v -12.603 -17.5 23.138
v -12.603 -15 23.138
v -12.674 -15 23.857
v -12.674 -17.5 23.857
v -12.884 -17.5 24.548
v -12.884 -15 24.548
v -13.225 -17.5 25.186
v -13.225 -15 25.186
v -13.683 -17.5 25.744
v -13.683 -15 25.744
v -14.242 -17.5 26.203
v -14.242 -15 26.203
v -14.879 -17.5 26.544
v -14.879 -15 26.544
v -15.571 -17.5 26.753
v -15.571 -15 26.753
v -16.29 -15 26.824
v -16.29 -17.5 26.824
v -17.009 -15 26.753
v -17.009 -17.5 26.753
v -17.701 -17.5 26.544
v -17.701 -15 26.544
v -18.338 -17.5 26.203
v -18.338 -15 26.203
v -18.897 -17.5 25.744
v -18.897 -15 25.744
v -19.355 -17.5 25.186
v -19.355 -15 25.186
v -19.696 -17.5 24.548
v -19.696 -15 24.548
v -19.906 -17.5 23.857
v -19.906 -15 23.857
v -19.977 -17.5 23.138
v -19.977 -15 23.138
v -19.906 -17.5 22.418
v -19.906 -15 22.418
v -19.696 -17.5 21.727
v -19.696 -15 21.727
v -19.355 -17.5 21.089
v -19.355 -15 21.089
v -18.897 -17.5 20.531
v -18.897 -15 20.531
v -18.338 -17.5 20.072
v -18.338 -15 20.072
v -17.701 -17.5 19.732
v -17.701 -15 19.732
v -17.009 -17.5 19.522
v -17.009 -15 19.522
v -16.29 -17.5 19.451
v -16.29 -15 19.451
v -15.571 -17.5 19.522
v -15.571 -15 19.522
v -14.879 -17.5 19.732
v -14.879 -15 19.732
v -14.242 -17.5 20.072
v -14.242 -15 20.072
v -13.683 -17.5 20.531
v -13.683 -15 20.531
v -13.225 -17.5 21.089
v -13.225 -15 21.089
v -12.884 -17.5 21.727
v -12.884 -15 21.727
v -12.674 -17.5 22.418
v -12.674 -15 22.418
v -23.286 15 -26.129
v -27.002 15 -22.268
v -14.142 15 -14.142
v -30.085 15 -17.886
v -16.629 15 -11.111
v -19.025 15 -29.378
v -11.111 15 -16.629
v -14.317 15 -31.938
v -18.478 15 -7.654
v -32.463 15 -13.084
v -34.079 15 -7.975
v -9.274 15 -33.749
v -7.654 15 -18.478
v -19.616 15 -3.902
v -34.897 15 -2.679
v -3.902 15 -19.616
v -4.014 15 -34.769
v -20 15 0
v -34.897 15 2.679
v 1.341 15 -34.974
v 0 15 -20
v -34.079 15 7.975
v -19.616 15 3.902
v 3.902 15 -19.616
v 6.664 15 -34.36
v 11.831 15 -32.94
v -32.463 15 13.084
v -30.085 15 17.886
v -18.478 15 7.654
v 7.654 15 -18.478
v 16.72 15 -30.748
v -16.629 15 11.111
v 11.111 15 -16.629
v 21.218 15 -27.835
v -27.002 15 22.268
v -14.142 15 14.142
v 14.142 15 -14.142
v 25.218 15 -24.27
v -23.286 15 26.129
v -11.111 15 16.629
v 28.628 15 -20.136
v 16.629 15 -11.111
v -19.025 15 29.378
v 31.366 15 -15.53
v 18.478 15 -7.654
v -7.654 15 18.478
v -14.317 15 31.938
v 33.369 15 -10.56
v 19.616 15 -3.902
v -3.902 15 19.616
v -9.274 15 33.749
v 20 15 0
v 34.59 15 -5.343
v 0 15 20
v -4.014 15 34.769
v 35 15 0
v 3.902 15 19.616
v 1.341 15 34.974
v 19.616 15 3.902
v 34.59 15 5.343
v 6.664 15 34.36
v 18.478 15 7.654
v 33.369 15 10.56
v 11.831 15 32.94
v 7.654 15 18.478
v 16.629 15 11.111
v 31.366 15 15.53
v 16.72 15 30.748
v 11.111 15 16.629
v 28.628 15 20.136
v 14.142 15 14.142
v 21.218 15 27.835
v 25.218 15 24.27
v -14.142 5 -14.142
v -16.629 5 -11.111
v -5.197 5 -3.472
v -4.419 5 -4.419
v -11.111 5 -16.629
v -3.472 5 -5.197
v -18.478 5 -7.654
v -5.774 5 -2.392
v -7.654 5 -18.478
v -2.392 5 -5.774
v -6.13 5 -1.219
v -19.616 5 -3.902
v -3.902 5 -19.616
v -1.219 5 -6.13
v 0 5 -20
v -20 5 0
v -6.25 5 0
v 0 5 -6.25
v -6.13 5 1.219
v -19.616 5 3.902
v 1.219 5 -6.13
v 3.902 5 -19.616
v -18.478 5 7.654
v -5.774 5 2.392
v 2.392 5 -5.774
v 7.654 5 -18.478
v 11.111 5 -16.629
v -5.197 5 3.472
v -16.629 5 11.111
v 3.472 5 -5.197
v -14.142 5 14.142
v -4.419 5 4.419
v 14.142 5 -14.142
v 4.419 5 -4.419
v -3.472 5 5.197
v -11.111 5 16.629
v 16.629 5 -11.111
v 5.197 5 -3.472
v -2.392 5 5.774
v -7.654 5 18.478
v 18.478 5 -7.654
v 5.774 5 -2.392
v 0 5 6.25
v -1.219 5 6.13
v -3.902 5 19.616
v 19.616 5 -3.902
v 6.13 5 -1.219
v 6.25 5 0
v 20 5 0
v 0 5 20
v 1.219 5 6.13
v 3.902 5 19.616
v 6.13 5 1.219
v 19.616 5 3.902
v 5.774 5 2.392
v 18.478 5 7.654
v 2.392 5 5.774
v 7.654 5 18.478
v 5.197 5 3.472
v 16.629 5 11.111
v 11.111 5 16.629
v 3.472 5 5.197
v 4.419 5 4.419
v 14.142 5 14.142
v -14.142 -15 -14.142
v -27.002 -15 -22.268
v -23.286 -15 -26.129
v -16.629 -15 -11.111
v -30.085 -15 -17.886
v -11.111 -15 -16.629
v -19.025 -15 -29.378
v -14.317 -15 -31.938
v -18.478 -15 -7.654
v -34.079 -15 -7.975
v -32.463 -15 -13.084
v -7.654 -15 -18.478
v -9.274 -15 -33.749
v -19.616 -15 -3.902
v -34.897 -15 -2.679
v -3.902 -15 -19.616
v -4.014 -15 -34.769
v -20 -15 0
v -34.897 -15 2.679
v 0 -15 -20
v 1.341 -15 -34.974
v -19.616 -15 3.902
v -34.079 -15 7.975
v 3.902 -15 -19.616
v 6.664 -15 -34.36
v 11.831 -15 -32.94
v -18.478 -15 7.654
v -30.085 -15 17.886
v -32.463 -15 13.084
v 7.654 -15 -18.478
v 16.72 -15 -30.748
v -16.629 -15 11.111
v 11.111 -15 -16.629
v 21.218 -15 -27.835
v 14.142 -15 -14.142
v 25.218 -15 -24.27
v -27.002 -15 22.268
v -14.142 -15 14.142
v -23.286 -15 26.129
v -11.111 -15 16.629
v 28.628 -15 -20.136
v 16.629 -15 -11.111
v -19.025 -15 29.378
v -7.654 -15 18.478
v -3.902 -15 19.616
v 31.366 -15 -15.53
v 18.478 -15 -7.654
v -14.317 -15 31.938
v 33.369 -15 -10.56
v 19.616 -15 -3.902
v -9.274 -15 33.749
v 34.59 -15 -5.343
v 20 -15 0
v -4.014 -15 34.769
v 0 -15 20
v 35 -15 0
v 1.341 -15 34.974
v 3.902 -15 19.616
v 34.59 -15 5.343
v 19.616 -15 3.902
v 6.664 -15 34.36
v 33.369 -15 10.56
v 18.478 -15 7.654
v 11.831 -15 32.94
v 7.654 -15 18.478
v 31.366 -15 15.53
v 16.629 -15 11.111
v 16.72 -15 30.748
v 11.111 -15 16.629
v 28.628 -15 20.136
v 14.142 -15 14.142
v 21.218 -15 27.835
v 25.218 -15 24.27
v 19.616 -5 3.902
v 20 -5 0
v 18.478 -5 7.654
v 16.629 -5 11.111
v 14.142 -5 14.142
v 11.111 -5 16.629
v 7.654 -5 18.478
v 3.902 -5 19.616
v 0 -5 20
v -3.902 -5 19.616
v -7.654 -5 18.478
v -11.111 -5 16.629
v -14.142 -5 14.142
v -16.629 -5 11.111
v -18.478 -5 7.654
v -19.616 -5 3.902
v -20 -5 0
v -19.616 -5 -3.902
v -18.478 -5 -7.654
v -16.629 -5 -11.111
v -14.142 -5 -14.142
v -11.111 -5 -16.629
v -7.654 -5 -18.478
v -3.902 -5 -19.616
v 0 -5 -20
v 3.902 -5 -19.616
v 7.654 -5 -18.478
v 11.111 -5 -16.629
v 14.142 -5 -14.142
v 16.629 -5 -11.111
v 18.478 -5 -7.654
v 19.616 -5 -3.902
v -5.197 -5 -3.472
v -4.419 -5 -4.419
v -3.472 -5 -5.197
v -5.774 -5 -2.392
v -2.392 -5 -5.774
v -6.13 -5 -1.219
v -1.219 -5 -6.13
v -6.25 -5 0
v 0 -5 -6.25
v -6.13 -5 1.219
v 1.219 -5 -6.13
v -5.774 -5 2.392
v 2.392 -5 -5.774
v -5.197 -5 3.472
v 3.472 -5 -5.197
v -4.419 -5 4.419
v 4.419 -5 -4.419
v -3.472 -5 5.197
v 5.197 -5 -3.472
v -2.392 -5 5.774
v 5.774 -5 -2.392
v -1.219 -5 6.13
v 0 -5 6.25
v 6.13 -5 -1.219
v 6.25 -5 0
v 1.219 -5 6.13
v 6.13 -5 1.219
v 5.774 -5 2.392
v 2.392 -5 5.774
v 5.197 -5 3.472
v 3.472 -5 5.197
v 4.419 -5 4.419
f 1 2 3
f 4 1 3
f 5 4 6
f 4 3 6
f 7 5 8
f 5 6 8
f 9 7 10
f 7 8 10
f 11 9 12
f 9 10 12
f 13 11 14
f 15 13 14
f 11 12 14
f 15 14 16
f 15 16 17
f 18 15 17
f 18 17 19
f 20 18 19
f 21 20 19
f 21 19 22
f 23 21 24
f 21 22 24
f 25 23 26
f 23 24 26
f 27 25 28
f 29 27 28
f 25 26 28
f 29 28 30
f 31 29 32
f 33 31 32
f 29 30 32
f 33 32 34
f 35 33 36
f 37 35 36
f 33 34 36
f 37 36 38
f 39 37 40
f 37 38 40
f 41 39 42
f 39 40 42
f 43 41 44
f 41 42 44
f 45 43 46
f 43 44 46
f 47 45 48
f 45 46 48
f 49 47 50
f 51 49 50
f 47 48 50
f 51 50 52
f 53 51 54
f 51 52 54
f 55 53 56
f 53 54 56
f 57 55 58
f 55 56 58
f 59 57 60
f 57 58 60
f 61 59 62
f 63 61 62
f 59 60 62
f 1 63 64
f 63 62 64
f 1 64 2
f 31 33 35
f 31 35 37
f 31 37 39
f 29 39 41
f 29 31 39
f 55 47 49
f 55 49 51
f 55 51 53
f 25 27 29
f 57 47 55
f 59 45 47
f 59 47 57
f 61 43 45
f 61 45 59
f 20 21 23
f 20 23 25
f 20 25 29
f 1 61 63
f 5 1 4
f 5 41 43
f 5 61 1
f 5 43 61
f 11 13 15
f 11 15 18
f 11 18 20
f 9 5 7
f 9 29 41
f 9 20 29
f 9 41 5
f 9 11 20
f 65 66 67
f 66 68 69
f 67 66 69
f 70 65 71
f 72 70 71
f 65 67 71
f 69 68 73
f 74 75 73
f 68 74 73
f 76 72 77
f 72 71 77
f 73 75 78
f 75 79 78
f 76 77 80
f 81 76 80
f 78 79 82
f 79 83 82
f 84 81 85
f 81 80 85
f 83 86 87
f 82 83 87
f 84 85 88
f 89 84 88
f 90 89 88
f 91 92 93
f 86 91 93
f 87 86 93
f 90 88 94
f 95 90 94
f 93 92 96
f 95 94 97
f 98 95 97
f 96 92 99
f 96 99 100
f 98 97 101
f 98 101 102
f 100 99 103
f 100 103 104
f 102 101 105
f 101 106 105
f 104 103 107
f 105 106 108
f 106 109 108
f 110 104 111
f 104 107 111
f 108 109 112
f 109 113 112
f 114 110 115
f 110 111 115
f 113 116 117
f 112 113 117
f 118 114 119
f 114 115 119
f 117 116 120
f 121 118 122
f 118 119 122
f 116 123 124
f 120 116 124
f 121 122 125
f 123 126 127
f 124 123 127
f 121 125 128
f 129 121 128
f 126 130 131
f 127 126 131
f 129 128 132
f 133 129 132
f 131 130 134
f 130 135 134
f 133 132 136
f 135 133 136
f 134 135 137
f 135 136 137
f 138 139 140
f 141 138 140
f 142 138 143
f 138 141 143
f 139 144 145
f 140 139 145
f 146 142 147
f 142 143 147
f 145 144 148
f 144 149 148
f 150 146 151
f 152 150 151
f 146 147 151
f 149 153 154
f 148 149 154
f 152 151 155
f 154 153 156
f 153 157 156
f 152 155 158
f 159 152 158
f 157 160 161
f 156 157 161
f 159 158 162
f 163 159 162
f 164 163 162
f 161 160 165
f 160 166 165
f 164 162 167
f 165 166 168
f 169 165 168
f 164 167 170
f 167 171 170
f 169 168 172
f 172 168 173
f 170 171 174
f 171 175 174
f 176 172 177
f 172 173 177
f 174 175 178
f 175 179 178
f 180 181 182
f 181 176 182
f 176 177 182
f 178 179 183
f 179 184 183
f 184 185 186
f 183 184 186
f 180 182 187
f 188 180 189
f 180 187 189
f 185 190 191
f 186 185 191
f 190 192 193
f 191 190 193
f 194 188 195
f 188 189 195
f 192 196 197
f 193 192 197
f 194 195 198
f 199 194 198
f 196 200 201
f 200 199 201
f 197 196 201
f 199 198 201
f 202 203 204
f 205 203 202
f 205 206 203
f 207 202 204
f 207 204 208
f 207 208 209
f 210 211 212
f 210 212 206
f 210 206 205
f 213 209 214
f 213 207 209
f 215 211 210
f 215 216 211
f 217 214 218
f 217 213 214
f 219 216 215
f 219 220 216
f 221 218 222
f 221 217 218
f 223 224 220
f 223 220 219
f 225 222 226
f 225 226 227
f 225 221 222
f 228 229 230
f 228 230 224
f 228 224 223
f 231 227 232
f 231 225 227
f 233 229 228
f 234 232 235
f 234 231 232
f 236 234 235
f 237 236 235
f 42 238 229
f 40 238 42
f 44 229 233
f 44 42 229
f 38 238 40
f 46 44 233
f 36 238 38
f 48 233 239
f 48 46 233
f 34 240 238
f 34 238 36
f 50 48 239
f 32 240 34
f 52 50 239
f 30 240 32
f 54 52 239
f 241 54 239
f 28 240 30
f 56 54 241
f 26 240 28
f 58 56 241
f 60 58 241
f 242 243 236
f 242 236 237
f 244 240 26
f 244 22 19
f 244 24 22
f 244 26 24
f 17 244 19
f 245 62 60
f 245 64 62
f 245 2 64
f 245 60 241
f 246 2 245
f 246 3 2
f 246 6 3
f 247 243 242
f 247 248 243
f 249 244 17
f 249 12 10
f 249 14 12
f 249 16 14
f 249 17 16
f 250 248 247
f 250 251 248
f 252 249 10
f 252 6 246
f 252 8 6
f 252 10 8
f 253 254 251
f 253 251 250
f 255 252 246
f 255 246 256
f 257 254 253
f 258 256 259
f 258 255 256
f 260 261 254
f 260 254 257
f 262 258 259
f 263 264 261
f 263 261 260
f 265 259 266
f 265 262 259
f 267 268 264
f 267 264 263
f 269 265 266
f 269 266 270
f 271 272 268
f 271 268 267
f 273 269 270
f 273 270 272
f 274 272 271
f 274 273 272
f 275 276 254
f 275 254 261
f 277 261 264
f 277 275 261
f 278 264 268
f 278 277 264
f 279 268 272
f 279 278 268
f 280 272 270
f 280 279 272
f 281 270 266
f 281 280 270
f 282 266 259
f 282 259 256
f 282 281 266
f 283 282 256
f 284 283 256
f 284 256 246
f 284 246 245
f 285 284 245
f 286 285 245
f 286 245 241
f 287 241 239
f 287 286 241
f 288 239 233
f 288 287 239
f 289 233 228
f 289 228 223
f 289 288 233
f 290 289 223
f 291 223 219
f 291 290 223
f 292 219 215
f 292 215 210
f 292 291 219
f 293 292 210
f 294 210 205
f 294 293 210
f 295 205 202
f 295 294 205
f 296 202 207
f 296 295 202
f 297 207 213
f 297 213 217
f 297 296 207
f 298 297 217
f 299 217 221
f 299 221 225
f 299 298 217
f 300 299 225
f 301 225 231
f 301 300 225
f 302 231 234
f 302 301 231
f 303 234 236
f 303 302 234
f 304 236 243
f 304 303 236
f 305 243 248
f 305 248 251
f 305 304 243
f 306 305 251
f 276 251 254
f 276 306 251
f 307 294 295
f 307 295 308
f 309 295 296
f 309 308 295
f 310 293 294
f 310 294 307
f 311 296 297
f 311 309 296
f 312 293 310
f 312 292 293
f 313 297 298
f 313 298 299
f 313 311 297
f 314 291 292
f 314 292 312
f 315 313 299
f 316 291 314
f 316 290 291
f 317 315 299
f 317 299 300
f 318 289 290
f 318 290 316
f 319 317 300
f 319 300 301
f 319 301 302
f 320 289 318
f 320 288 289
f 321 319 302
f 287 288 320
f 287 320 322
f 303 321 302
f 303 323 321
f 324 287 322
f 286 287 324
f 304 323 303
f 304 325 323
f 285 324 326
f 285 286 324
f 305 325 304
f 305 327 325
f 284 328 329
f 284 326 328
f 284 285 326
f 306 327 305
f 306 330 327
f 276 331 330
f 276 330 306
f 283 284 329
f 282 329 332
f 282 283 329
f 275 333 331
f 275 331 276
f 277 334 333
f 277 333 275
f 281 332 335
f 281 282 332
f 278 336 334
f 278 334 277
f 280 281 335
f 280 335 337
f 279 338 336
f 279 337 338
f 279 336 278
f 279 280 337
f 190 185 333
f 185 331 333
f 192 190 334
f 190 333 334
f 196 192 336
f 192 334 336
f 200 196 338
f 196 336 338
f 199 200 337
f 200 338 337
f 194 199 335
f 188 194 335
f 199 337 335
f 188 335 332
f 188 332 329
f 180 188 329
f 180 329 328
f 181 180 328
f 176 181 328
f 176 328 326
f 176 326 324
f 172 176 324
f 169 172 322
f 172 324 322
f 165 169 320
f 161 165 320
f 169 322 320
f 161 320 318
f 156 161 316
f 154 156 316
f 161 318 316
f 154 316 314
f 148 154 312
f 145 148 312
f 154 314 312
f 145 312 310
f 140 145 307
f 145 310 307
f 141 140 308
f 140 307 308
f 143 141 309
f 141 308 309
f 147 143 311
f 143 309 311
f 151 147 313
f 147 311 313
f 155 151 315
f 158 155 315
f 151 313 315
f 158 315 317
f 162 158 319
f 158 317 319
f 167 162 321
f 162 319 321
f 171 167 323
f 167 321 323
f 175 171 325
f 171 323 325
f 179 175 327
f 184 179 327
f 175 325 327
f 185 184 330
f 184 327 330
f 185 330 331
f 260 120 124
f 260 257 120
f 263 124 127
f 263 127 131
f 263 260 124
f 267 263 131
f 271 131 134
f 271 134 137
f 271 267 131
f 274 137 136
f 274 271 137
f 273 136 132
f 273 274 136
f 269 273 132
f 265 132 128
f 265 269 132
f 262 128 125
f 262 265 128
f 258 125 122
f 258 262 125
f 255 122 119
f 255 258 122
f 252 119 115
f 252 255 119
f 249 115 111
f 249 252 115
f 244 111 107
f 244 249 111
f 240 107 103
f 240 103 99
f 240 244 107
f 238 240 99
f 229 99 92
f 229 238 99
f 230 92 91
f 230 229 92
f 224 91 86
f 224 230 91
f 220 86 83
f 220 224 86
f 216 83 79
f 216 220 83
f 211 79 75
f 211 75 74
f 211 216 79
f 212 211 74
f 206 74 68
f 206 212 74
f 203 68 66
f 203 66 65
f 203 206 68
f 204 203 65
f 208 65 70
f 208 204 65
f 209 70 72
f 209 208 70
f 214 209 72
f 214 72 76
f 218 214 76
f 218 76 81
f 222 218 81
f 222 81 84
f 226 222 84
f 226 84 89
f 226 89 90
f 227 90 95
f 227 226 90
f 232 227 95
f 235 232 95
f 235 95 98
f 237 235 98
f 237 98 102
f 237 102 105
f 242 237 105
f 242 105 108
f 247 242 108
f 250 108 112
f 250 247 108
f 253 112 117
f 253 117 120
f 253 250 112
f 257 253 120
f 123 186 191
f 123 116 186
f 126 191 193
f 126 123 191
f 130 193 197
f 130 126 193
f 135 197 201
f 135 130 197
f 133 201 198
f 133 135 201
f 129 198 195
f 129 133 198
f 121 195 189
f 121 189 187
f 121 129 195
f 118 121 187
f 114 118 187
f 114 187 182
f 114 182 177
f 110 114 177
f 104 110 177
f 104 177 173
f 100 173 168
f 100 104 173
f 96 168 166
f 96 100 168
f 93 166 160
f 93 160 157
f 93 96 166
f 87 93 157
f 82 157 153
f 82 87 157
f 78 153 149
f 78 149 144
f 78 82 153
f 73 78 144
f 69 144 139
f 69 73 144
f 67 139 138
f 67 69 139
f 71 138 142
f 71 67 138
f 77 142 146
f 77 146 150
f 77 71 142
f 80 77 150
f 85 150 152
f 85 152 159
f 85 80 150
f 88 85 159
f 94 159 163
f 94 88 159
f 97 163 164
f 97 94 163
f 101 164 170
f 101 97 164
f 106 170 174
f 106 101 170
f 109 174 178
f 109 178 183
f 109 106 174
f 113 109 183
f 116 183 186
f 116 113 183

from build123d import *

# Parameters (mm, degrees)
F0_R     = 35
F0_R_2   = 20
F1_DEPTH = 15
F2_DEPTH = 5
F3_R     = 6.25
F4_DEPTH = 20
F5_R     = 3.686616
F6_DEPTH = 2.5


with BuildPart() as f1:
    # F0 (on Front) → F1 (new body, symmetric)
    with BuildSketch(Plane.XZ):
        Circle(F0_R)
        Circle(F0_R_2, mode=Mode.SUBTRACT)
    extrude(amount=F1_DEPTH, both=True)

    # F0 (on Front) → F2 (join, symmetric)
    with BuildSketch(Plane.XZ):
        Circle(F0_R_2)
    extrude(amount=F2_DEPTH, both=True)

    # F3 (on face) → F4 (cut, symmetric)
    with BuildSketch(Plane.XZ.offset(5)):
        Circle(F3_R)
    extrude(amount=F4_DEPTH, both=True, mode=Mode.SUBTRACT)

    # F5 (on face) → F6 (join)
    with BuildSketch(Plane.XZ.offset(15)):
        with Locations((-16.290108, 23.137607)):
            Circle(F5_R)
    extrude(amount=F6_DEPTH)


solid = f1.part
